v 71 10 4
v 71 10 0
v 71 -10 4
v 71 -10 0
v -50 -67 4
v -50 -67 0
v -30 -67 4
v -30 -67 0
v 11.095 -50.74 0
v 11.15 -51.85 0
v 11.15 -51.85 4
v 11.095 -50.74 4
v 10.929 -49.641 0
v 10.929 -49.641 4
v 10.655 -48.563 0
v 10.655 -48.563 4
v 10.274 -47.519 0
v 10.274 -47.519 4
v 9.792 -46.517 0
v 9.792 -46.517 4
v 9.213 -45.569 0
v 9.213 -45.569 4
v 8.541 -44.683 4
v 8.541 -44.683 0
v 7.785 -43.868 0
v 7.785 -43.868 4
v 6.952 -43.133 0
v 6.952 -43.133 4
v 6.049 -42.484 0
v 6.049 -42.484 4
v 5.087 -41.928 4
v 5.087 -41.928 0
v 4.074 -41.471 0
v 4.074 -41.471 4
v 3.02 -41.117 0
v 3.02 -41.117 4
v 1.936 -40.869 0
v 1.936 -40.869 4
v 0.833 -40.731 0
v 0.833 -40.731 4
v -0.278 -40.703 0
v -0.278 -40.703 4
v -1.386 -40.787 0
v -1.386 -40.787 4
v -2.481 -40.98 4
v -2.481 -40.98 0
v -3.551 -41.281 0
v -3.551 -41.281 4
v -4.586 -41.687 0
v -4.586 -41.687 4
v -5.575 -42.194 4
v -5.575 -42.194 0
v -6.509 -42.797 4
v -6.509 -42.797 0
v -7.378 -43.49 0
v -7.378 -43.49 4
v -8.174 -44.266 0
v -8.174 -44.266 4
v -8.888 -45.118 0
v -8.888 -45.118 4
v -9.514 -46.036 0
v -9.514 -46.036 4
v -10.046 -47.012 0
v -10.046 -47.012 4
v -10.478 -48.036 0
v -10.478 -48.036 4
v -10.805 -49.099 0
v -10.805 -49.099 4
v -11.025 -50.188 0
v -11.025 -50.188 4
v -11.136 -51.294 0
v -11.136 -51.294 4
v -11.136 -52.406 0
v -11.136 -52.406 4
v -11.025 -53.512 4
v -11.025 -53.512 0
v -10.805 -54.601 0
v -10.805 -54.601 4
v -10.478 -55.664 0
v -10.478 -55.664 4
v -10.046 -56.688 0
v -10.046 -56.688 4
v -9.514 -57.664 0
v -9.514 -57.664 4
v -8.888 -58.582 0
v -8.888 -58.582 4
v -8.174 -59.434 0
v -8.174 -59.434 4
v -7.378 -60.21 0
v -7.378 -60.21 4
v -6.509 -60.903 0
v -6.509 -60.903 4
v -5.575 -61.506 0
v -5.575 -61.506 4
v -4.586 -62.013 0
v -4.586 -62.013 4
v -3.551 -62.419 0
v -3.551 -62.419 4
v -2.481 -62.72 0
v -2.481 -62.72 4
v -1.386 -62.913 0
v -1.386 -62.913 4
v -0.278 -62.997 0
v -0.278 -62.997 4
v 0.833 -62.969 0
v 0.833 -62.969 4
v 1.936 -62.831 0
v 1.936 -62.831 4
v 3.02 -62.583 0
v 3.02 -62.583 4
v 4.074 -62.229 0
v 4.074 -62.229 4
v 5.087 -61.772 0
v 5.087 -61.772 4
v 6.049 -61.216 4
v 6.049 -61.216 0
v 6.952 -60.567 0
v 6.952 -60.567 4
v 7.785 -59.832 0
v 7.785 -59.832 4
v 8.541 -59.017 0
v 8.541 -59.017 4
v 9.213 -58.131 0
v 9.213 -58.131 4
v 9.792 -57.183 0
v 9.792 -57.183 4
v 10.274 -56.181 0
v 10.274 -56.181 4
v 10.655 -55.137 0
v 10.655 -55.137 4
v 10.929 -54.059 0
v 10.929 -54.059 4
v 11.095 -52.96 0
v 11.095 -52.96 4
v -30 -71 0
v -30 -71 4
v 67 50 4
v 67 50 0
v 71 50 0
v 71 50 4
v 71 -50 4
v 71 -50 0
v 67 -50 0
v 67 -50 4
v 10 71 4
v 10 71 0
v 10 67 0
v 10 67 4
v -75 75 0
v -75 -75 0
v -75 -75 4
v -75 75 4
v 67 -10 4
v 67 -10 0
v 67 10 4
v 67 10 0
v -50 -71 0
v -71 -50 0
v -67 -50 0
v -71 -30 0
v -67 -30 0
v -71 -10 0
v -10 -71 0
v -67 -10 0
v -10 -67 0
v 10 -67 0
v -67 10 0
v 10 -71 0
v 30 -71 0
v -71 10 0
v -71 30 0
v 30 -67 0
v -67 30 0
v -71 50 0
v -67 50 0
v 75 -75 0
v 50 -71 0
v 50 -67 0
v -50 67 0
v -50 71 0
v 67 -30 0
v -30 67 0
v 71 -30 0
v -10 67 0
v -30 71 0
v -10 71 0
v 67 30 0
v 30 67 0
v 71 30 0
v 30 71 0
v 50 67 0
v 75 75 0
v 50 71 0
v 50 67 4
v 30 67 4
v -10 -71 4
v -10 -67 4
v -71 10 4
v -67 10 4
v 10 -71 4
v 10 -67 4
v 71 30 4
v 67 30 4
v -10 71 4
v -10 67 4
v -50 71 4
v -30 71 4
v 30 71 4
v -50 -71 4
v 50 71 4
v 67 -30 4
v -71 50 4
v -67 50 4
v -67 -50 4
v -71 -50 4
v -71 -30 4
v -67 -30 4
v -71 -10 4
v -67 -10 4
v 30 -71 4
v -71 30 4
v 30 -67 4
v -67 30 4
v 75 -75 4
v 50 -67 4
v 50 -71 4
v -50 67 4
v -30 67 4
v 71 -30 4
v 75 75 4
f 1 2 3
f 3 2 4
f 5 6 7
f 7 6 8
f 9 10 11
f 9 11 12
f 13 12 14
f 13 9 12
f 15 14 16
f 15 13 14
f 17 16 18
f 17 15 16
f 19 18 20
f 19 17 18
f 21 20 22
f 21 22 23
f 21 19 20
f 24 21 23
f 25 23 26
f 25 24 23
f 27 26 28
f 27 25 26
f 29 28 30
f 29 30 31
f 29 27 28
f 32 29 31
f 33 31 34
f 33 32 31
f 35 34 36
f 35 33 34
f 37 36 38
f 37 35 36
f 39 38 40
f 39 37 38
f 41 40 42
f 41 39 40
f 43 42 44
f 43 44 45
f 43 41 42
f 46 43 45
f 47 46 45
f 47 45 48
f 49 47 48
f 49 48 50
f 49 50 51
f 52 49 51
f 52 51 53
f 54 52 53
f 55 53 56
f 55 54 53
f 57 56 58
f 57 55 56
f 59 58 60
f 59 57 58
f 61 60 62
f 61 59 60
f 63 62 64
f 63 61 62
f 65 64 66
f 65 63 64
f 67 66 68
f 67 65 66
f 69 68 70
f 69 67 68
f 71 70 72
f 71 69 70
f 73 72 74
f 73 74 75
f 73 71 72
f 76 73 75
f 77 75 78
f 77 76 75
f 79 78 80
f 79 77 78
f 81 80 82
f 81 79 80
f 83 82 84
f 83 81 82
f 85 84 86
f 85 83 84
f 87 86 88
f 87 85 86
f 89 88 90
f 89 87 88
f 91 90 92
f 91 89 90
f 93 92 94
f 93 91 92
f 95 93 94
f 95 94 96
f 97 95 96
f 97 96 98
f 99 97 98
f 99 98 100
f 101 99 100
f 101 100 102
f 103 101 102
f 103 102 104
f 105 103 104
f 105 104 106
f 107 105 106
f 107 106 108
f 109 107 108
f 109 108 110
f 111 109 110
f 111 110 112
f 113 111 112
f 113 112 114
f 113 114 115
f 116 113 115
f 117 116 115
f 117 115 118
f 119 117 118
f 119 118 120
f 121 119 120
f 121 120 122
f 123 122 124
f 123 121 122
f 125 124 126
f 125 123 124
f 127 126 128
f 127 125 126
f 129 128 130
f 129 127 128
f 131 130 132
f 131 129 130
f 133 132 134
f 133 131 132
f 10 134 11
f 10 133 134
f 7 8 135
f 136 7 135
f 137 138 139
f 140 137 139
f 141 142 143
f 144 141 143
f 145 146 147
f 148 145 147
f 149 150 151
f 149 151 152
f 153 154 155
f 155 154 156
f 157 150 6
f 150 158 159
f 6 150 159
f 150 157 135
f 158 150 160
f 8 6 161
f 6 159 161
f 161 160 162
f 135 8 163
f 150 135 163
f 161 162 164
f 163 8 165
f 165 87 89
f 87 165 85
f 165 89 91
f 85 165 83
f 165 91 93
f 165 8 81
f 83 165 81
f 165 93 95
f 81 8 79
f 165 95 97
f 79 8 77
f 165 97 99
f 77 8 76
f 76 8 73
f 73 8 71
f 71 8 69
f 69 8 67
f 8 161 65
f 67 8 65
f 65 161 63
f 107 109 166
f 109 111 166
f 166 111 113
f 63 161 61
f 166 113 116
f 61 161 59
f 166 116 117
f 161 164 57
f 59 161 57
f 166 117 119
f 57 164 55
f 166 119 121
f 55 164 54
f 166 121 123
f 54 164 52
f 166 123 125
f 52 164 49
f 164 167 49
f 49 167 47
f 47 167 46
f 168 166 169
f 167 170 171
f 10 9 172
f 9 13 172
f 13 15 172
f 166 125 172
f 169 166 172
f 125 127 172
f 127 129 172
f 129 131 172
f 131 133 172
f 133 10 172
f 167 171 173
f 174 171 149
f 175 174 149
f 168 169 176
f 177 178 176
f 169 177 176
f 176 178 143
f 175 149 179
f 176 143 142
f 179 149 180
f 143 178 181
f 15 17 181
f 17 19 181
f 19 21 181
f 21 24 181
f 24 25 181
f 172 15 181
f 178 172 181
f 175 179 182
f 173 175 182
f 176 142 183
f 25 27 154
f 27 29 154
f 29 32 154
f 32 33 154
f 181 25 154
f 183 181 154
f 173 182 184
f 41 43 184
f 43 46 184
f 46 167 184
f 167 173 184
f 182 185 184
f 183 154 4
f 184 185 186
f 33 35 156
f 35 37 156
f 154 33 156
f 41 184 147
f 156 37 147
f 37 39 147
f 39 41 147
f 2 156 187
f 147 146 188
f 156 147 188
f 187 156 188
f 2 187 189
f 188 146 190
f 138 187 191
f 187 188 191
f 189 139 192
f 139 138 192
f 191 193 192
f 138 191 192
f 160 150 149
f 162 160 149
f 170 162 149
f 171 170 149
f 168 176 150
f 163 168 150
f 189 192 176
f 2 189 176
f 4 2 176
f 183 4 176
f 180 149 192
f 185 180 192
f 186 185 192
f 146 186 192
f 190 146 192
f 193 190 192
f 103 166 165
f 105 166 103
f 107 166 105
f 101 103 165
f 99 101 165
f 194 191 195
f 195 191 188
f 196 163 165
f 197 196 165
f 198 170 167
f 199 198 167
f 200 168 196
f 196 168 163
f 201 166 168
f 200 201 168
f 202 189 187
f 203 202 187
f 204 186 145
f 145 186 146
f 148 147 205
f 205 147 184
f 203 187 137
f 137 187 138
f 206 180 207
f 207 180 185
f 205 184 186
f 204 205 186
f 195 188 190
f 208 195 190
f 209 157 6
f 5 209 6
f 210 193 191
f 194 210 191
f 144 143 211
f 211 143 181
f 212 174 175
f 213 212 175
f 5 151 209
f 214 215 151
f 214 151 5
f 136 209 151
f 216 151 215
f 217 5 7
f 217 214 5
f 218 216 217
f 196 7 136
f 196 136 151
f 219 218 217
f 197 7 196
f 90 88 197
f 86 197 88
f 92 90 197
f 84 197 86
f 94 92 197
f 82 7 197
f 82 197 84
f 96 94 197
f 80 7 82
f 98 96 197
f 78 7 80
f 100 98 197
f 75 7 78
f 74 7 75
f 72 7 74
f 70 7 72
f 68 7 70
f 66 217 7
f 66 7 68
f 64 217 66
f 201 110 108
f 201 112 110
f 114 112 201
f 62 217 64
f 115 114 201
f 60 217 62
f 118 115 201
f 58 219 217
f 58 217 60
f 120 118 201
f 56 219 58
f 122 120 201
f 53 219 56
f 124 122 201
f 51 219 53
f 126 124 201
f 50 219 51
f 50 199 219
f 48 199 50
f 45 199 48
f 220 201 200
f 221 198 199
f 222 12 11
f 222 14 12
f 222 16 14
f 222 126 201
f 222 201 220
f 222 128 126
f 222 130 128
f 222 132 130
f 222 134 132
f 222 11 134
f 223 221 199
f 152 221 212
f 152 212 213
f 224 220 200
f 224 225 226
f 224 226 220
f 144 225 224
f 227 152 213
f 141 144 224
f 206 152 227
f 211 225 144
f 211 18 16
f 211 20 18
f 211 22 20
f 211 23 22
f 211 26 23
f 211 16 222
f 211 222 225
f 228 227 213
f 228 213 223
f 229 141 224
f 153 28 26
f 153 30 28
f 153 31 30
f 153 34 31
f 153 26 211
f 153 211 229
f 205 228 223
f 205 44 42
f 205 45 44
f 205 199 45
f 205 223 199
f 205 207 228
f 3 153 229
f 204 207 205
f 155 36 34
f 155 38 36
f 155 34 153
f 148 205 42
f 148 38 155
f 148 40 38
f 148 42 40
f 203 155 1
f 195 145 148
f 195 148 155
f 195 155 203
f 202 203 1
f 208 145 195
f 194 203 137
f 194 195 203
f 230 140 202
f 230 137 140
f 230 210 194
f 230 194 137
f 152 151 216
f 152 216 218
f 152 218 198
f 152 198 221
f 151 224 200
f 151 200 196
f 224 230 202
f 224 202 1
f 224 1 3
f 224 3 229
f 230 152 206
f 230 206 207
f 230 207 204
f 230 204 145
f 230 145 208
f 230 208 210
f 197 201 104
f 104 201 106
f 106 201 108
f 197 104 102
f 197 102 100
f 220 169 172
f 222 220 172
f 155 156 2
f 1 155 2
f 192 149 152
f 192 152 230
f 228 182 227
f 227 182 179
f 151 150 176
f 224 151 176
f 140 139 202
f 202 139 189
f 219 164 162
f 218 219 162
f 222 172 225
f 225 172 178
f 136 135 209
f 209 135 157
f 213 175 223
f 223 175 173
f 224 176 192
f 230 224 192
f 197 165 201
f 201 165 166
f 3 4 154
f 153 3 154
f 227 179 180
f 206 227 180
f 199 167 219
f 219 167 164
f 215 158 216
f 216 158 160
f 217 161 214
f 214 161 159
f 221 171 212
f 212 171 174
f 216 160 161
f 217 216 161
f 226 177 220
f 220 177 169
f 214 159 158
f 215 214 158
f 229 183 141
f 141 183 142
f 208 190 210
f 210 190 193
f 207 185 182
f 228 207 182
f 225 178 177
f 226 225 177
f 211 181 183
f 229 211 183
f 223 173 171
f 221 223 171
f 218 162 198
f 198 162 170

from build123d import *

# Parameters (mm, degrees)
F0_W     = 150
F0_H     = 150
F0_R     = 11.15
F1_DEPTH = 4


with BuildPart() as f1:
    # F0 (on Top) → F1 (new body)
    with BuildSketch(Plane.XY):
        Rectangle(F0_W, F0_H)
        Polygon((-30, -71), (-40, -71), (-50, -71), (-50, -67), (-40, -67), (-30, -67), align=None, mode=Mode.SUBTRACT)
        Polygon((-71, -30), (-67, -30), (-67, -50), (-71, -50), (-71, -40), align=None, mode=Mode.SUBTRACT)
        Polygon((-10, -71), (-10, -67), (0, -67), (10, -67), (10, -71), (0, -71), align=None, mode=Mode.SUBTRACT)
        with Locations((0, -51.85)):
            Circle(F0_R, mode=Mode.SUBTRACT)
        Polygon((50, -71), (40, -71), (30, -71), (30, -67), (40, -67), (50, -67), align=None, mode=Mode.SUBTRACT)
        Polygon((71, -50), (67, -50), (67, -30), (71, -30), (71, -40), align=None, mode=Mode.SUBTRACT)
        Polygon((-71, -10), (-71, 0), (-71, 10), (-67, 10), (-67, 0), (-67, -10), align=None, mode=Mode.SUBTRACT)
        Polygon((-71, 50), (-67, 50), (-67, 30), (-71, 30), (-71, 40), align=None, mode=Mode.SUBTRACT)
        Polygon((-30, 71), (-30, 67), (-40, 67), (-50, 67), (-50, 71), (-40, 71), align=None, mode=Mode.SUBTRACT)
        Polygon((71, 0), (71, -10), (67, -10), (67, 10), (71, 10), align=None, mode=Mode.SUBTRACT)
        Polygon((-10, 71), (0, 71), (10, 71), (10, 67), (0, 67), (-10, 67), align=None, mode=Mode.SUBTRACT)
        Polygon((71, 30), (67, 30), (67, 50), (71, 50), (71, 40), align=None, mode=Mode.SUBTRACT)
        Polygon((30, 71), (40, 71), (50, 71), (50, 67), (40, 67), (30, 67), align=None, mode=Mode.SUBTRACT)
    extrude(amount=F1_DEPTH)


solid = f1.part
